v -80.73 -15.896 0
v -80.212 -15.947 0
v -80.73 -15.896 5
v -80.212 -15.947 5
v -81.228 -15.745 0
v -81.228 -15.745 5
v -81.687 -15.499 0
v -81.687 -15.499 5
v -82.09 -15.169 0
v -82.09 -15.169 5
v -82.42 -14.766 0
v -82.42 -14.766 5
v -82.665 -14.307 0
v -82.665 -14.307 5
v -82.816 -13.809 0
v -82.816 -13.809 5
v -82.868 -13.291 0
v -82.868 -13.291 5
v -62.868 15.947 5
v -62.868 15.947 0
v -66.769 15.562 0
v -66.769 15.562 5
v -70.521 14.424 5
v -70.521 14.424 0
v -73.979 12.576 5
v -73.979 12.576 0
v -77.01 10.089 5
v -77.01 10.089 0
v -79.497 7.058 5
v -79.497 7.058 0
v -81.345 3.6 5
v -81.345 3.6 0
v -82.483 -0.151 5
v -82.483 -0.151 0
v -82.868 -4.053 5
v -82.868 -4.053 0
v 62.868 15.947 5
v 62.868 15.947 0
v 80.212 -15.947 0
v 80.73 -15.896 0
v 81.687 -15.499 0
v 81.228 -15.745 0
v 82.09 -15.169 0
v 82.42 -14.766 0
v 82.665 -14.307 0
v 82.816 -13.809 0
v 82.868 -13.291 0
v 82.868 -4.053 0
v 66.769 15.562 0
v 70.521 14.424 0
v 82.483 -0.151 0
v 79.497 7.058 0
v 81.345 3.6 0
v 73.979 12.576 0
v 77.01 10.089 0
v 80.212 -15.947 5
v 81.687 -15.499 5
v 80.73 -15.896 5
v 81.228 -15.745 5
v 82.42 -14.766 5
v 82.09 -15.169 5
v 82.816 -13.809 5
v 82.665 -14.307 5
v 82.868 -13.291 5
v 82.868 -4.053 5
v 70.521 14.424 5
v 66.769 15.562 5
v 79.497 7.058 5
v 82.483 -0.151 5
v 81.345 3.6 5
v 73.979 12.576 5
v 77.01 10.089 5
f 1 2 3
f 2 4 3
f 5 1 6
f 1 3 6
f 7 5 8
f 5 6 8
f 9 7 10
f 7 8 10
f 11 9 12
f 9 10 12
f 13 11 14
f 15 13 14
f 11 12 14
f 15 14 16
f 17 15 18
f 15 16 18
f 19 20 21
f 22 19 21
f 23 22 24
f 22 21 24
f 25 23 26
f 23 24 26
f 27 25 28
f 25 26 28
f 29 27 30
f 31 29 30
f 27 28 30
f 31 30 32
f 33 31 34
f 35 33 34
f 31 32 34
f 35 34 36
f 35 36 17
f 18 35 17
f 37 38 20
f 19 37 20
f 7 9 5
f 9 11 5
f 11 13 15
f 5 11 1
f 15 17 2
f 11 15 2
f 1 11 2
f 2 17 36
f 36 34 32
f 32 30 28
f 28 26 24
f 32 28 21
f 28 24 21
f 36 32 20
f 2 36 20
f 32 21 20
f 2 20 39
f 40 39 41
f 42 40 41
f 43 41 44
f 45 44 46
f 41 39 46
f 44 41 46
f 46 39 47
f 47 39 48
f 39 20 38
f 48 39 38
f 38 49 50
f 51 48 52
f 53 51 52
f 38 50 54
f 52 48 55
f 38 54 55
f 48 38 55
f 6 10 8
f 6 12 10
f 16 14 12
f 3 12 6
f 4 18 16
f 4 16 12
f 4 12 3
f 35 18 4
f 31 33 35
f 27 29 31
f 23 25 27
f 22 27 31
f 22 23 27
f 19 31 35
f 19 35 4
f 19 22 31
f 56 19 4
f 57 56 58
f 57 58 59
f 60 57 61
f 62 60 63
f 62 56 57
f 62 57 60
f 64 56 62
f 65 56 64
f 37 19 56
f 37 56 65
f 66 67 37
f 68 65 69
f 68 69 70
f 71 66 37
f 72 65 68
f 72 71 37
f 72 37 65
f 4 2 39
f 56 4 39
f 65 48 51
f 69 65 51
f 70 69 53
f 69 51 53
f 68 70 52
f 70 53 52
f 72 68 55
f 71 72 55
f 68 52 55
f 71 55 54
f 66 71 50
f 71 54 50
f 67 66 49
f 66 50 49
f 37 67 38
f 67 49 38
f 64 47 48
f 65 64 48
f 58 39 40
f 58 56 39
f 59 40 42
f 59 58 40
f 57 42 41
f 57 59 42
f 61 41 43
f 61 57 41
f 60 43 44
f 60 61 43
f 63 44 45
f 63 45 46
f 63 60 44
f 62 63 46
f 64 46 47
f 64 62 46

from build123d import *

# Parameters (mm, degrees)
F1_DEPTH = 5
F2_R     = 2.655635
F3_R     = 2.656


with BuildPart() as f1:
    # F0 (on Top) → F1 (new body)
    with BuildSketch(Plane.XY):
        with BuildLine():
            Line((-82.867503, -15.946694), (82.867503, -15.946694))
            Line((82.867503, -15.946694), (82.867503, -4.053306))
            ThreePointArc((82.867503, -4.053306), (77.009639, 10.088829), (62.867503, 15.946694))
            Line((62.867503, 15.946694), (-62.867503, 15.946694))
            ThreePointArc((-62.867503, 15.946694), (-77.009639, 10.088829), (-82.867503, -4.053306))
            Line((-82.867503, -4.053306), (-82.867503, -15.946694))
        make_face()
    extrude(amount=F1_DEPTH)

    # F2
    f2_edges = [f1.edges().sort_by_distance(p)[0] for p in [
        (-82.867503, -15.946694, 2.5),
    ]]
    fillet(f2_edges, radius=F2_R)

    # F3
    f3_edges = [f1.edges().sort_by_distance(p)[0] for p in [
        (82.867503, -15.946694, 2.5),
    ]]
    fillet(f3_edges, radius=F3_R)


solid = f1.part
